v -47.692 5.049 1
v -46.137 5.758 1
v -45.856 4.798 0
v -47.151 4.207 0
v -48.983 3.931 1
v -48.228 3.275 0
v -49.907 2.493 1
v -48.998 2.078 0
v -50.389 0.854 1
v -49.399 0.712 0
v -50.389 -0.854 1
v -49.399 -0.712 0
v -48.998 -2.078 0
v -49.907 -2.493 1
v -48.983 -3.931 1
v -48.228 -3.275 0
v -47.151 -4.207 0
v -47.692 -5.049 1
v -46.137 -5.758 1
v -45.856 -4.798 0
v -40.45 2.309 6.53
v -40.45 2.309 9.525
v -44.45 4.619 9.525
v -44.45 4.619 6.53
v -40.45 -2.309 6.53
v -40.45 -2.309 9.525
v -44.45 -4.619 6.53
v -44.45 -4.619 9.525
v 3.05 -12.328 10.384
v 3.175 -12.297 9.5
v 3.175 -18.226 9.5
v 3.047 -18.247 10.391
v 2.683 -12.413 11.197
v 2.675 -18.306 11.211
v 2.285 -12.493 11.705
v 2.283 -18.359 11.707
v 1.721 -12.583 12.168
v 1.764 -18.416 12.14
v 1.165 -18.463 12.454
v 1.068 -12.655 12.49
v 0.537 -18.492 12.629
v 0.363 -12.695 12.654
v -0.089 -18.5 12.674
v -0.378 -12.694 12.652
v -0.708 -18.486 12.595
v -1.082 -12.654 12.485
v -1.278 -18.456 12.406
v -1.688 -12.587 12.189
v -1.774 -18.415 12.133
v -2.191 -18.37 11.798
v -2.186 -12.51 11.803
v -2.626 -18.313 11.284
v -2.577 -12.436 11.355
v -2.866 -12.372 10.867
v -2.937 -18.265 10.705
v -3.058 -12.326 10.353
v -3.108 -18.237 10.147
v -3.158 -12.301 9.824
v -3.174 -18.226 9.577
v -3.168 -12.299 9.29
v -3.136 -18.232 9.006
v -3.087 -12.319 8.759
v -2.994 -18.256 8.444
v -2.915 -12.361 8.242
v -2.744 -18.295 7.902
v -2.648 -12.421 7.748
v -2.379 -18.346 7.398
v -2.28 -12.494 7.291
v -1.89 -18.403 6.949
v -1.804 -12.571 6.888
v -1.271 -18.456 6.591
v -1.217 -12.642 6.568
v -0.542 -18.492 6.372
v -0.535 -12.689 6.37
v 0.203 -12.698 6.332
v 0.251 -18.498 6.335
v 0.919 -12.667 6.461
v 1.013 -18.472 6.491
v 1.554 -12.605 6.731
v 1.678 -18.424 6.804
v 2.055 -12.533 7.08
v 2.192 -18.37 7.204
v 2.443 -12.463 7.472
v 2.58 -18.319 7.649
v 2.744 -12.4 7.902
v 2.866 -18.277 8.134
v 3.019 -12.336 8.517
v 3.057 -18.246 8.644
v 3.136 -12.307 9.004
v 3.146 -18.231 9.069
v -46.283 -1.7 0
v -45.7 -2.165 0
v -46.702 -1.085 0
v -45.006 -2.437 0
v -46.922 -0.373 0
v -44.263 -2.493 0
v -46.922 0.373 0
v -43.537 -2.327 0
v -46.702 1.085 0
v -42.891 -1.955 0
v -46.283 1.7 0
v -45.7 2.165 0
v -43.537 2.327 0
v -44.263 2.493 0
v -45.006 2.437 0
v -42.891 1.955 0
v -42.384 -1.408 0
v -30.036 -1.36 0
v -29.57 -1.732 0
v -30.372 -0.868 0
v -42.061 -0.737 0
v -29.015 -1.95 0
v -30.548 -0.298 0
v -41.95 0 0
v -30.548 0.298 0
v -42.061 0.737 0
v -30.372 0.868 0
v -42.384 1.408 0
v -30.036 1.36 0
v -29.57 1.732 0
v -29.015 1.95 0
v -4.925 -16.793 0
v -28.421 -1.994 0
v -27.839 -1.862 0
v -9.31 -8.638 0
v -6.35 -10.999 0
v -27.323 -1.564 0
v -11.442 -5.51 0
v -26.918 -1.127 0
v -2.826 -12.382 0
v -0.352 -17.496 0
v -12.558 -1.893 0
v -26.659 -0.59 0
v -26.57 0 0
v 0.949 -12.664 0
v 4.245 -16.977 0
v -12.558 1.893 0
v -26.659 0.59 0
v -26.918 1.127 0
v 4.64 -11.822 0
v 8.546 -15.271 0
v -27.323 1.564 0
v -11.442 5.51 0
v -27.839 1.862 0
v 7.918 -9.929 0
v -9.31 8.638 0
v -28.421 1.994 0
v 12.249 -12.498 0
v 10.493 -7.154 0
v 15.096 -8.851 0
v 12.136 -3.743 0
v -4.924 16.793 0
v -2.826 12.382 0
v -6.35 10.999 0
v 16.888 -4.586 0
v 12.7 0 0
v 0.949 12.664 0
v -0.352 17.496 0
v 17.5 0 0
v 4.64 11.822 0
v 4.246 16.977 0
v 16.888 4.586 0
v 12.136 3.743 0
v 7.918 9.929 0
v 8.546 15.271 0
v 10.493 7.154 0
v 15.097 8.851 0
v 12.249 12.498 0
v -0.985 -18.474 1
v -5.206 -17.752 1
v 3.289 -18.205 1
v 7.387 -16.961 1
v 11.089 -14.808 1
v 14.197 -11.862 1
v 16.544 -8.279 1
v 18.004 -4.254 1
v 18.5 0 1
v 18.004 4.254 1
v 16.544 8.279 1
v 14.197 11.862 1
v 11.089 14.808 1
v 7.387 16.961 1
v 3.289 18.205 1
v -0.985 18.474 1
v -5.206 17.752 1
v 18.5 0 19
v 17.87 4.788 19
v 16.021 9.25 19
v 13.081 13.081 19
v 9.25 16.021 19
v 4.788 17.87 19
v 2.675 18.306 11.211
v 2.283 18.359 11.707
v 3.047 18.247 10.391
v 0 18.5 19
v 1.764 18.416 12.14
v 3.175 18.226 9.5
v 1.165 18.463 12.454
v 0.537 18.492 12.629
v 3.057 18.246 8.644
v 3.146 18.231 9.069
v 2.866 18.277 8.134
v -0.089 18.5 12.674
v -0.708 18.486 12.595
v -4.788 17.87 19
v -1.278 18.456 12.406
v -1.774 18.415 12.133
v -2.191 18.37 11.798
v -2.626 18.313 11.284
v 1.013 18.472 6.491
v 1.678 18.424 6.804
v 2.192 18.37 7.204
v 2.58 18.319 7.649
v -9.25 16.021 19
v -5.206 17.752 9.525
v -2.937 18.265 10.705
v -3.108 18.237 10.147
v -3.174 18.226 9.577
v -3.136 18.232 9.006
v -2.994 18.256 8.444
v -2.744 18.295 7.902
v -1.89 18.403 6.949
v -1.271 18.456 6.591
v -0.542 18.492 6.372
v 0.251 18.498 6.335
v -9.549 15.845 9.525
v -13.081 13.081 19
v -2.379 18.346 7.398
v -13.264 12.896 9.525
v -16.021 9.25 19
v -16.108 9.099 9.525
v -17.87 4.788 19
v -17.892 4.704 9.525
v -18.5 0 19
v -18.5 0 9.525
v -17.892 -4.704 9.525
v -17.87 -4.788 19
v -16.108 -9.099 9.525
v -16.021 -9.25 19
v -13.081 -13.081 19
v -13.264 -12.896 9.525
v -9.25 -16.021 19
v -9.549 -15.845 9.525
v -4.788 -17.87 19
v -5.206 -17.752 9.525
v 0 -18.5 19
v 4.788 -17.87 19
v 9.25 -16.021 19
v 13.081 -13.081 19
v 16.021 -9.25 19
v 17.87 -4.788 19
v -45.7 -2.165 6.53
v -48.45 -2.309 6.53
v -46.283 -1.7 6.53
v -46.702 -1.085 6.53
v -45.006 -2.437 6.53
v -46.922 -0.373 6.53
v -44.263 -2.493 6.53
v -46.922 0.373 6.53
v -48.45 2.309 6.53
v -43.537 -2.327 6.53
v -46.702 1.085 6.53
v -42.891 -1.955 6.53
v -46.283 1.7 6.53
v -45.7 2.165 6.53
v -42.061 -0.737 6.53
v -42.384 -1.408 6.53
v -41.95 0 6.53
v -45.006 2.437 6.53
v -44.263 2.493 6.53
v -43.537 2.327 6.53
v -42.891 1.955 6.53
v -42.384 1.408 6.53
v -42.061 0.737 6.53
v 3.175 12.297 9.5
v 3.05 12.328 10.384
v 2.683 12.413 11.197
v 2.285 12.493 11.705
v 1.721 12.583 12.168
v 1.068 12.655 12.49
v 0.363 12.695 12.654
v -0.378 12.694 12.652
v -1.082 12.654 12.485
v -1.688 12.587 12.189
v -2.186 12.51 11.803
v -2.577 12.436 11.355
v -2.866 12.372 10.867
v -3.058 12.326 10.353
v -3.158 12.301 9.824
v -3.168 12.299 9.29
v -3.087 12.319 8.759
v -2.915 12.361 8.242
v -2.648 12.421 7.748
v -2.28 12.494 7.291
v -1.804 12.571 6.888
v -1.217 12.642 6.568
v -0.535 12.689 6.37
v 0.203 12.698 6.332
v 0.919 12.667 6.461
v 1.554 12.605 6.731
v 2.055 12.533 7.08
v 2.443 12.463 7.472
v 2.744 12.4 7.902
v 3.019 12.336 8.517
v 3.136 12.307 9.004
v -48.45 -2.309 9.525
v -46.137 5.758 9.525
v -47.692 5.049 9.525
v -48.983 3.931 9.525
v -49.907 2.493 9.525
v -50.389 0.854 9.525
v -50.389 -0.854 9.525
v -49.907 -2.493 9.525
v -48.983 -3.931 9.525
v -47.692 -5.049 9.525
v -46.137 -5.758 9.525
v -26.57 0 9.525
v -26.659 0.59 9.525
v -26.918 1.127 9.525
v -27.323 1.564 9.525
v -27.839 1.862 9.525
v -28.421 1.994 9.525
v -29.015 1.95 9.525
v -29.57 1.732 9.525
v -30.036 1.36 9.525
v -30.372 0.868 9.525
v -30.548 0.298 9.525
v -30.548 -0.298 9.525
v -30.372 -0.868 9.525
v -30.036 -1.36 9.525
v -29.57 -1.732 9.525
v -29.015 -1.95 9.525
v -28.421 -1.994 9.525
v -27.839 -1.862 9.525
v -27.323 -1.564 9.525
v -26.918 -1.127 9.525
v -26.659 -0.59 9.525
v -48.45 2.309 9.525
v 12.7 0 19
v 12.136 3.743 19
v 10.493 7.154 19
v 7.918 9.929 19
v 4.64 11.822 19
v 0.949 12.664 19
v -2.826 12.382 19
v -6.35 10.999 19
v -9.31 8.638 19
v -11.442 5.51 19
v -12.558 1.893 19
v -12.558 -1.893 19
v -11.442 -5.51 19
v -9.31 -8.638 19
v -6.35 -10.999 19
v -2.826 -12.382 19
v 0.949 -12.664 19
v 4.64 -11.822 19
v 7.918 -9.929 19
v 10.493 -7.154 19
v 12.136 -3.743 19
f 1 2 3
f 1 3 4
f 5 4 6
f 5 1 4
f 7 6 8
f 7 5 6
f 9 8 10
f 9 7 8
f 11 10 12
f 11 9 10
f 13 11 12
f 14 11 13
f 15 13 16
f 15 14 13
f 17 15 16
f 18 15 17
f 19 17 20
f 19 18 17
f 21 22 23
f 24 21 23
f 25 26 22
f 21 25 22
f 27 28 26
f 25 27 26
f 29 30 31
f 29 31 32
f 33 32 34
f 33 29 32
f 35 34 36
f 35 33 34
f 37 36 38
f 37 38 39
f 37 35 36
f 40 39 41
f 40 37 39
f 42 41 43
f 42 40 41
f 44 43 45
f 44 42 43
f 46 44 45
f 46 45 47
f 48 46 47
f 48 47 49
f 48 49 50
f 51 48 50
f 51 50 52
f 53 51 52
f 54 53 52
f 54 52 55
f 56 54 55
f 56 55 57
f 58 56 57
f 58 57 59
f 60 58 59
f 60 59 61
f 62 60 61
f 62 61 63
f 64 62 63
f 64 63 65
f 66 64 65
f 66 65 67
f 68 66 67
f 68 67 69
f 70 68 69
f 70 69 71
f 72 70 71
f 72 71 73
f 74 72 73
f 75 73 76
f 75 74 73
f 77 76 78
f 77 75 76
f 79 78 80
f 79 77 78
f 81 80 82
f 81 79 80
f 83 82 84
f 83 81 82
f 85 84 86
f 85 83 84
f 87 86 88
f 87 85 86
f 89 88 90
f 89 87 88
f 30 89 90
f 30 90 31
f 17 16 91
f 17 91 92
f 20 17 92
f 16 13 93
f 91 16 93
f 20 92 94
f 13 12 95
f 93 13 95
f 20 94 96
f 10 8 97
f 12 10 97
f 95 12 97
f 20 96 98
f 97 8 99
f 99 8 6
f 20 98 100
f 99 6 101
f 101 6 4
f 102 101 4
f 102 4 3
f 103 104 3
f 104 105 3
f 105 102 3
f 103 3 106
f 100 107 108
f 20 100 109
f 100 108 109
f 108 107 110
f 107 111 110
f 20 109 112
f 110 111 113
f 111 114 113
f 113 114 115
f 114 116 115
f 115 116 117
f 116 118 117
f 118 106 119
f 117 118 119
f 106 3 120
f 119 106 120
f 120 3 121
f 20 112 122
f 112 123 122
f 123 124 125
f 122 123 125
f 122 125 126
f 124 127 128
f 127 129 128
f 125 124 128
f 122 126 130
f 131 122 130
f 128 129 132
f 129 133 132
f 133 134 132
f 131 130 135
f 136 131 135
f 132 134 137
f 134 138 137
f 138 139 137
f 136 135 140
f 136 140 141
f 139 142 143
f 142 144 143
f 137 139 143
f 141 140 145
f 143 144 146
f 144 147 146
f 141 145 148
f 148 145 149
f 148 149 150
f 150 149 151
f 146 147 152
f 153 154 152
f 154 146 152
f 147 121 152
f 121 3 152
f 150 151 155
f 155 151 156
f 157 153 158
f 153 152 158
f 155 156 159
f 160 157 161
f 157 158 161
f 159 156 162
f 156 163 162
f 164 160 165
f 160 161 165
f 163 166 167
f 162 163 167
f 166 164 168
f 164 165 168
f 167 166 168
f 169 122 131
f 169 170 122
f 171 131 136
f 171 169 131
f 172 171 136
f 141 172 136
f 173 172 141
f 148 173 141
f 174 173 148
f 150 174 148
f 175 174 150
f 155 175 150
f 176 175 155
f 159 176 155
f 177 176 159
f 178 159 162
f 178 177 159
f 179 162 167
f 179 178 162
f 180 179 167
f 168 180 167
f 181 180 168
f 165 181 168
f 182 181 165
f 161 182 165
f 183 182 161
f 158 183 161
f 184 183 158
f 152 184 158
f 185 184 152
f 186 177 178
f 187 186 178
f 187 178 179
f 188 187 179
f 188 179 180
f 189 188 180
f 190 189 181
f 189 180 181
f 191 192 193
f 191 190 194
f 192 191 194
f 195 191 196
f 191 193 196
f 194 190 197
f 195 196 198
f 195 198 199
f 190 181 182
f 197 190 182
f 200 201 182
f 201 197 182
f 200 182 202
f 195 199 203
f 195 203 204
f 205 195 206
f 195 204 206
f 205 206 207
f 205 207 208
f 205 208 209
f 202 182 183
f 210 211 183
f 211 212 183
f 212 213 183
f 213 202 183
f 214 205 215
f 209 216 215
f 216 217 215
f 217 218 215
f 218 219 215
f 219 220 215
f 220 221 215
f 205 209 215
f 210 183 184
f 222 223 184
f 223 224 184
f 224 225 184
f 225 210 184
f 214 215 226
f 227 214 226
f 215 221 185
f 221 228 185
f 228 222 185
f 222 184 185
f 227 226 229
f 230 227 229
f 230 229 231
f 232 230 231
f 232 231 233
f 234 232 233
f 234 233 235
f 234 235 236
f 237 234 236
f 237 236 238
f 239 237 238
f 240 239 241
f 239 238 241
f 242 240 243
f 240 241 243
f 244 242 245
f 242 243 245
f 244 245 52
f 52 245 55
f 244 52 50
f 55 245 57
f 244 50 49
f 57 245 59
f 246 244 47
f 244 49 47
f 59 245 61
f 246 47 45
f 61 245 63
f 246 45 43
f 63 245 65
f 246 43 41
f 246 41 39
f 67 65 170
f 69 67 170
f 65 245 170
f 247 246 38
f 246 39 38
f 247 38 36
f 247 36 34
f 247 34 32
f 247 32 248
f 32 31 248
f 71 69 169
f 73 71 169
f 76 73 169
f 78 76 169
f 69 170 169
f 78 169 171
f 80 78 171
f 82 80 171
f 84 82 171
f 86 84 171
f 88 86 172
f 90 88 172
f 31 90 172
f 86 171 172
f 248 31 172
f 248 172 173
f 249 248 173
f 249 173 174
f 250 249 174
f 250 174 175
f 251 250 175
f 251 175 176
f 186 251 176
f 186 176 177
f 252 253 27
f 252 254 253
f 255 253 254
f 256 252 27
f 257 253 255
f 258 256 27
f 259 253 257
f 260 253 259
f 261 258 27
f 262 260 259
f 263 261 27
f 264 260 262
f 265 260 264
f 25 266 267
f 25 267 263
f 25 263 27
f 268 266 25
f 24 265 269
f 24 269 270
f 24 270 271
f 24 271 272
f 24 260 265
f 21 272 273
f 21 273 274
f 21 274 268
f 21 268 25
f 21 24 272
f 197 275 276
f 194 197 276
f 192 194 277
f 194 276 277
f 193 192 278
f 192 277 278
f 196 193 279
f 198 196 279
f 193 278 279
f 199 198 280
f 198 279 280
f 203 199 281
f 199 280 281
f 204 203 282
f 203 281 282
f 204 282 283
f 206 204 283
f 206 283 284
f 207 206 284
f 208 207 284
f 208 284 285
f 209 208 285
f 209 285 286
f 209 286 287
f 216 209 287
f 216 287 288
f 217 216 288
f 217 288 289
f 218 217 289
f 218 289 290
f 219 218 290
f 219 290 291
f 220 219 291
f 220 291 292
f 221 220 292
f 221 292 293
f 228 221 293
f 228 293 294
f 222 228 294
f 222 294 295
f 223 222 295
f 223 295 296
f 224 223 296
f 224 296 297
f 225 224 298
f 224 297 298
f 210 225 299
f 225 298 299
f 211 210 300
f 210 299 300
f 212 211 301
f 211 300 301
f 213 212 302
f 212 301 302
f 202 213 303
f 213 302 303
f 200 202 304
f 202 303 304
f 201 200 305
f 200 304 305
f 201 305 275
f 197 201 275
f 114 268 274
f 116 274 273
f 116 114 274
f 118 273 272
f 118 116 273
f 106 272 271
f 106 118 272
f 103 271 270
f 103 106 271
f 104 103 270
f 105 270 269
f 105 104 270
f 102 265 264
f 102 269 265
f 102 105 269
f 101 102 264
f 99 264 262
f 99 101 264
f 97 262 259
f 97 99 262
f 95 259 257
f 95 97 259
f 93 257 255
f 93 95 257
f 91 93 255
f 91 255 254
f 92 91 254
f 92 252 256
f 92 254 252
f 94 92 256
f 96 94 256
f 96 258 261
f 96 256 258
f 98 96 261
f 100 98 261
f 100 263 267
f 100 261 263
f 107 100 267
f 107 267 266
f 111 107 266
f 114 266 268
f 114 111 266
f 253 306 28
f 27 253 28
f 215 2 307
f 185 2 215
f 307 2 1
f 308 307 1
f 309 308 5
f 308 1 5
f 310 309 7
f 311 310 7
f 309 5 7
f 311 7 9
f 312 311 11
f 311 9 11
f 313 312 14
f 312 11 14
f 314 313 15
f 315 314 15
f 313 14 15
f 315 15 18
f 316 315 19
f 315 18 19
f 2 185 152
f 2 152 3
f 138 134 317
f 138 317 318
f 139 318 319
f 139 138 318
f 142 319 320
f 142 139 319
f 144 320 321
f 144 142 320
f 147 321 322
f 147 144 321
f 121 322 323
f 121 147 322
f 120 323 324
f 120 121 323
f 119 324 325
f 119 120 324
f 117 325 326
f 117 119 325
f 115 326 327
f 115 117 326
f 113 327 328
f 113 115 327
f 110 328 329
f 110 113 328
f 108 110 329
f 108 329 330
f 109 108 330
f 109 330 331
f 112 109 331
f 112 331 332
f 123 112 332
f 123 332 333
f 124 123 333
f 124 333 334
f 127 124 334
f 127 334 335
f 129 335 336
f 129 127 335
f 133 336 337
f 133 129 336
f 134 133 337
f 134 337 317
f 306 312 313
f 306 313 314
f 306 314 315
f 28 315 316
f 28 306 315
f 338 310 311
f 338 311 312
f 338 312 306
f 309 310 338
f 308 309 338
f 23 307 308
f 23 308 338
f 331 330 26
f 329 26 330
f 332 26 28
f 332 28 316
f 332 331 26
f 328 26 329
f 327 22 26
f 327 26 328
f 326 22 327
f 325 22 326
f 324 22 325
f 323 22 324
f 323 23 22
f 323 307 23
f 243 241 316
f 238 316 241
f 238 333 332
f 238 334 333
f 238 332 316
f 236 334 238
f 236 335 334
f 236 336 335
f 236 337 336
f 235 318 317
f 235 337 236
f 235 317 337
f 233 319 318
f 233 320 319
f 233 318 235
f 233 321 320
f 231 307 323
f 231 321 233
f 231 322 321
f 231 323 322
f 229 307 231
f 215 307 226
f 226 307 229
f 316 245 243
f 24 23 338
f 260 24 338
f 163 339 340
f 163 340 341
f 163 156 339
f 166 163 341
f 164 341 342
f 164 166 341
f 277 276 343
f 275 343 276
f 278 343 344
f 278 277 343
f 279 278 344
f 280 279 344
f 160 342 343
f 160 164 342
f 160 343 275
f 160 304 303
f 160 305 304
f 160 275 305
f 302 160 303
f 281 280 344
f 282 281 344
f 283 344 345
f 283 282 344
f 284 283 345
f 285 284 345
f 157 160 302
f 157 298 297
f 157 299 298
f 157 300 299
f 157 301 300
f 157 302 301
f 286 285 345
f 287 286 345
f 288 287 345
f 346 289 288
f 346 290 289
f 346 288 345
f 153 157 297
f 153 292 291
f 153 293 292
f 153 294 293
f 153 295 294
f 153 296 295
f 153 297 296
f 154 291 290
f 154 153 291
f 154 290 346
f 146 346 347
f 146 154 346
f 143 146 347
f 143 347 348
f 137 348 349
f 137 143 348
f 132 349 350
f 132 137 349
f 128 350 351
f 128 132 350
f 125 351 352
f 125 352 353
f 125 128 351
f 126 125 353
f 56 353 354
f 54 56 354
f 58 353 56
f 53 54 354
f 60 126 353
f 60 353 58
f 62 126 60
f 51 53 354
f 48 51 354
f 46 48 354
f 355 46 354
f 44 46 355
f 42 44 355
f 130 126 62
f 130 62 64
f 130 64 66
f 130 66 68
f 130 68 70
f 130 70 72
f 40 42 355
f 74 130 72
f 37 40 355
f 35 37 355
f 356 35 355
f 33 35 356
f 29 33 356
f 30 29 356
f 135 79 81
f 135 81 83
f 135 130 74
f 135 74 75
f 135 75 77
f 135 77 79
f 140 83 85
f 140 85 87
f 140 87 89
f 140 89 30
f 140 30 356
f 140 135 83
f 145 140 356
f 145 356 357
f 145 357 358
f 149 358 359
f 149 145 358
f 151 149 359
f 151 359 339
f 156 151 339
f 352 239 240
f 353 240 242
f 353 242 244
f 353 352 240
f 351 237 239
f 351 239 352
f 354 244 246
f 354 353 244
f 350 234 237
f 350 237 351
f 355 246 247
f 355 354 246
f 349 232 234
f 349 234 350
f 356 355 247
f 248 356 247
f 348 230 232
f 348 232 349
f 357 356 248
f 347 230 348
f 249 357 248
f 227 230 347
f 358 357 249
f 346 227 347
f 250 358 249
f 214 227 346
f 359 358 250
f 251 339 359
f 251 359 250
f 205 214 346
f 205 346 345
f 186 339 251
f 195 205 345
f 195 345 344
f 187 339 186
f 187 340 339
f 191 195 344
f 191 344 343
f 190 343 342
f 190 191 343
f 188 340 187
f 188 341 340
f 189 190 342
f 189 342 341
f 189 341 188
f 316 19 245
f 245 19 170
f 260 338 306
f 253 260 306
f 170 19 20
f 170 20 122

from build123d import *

# Parameters (mm, degrees)
SKETCH_R          = 12.7
SKETCH_R_2        = 2.5
SKETCH_R_3        = 2
PAD_DEPTH         = 9.525
SKETCH001_R       = 18.5
SKETCH001_R_2     = 12.7
PAD001_DEPTH      = 19
SKETCH002_R       = 3.175
POCKET_DEPTH      = 18.501
POCKET_DEPTH_BACK = -18.501
POCKET001_DEPTH   = 3
CHAMFER_SIZE      = 1


with BuildPart() as part:
    # Sketch (on XY_Plane of Origin) → Pad (new body)
    with BuildSketch(Plane.XY):
        with BuildLine():
            ThreePointArc((-46.137289, 5.757869), (-50.45, 0), (-46.137289, -5.757869))
            Line((-46.137289, -5.757869), (-5.202475, -17.753429))
            ThreePointArc((-5.202475, -17.753429), (18.5, 0), (-5.202475, 17.753429))
            Line((-46.137289, 5.757869), (-5.202475, 17.753429))
        make_face()
        Circle(SKETCH_R, mode=Mode.SUBTRACT)
        with Locations((-44.45, 0)):
            Circle(SKETCH_R_2, mode=Mode.SUBTRACT)
        with Locations((-28.57, 0)):
            Circle(SKETCH_R_3, mode=Mode.SUBTRACT)
    extrude(amount=PAD_DEPTH)

    # Sketch001 (on XY_Plane of Origin) → Pad001 (join)
    with BuildSketch(Plane.XY):
        Circle(SKETCH001_R)
        Circle(SKETCH001_R_2, mode=Mode.SUBTRACT)
    extrude(amount=PAD001_DEPTH)

    # Sketch002 (on XZ_Plane of Origin) → Pocket (cut, two sides)
    with BuildSketch(Plane.XZ) as pocket_sk:
        with Locations((0, 9.5)):
            Circle(SKETCH002_R)
    extrude(amount=-POCKET_DEPTH, mode=Mode.SUBTRACT)
    extrude(pocket_sk.sketch, amount=-POCKET_DEPTH_BACK, mode=Mode.SUBTRACT)

    # Sketch003 (on XY_Plane of Origin) → Pocket001 (cut)
    with BuildSketch(Plane.XY.offset(9.53)):
        Polygon((-44.45, 4.618802), (-48.45, 2.309401), (-48.45, -2.309401), (-44.45, -4.618802), (-40.45, -2.309401), (-40.45, 2.309401), align=None)
    extrude(amount=-POCKET001_DEPTH, mode=Mode.SUBTRACT)

    # Chamfer
    chamfer_edges = [part.edges().sort_by_distance(p)[0] for p in [
        (-25.669882, -11.755649, 0),
    ]]
    chamfer(chamfer_edges, length=CHAMFER_SIZE)


solid = part.part
